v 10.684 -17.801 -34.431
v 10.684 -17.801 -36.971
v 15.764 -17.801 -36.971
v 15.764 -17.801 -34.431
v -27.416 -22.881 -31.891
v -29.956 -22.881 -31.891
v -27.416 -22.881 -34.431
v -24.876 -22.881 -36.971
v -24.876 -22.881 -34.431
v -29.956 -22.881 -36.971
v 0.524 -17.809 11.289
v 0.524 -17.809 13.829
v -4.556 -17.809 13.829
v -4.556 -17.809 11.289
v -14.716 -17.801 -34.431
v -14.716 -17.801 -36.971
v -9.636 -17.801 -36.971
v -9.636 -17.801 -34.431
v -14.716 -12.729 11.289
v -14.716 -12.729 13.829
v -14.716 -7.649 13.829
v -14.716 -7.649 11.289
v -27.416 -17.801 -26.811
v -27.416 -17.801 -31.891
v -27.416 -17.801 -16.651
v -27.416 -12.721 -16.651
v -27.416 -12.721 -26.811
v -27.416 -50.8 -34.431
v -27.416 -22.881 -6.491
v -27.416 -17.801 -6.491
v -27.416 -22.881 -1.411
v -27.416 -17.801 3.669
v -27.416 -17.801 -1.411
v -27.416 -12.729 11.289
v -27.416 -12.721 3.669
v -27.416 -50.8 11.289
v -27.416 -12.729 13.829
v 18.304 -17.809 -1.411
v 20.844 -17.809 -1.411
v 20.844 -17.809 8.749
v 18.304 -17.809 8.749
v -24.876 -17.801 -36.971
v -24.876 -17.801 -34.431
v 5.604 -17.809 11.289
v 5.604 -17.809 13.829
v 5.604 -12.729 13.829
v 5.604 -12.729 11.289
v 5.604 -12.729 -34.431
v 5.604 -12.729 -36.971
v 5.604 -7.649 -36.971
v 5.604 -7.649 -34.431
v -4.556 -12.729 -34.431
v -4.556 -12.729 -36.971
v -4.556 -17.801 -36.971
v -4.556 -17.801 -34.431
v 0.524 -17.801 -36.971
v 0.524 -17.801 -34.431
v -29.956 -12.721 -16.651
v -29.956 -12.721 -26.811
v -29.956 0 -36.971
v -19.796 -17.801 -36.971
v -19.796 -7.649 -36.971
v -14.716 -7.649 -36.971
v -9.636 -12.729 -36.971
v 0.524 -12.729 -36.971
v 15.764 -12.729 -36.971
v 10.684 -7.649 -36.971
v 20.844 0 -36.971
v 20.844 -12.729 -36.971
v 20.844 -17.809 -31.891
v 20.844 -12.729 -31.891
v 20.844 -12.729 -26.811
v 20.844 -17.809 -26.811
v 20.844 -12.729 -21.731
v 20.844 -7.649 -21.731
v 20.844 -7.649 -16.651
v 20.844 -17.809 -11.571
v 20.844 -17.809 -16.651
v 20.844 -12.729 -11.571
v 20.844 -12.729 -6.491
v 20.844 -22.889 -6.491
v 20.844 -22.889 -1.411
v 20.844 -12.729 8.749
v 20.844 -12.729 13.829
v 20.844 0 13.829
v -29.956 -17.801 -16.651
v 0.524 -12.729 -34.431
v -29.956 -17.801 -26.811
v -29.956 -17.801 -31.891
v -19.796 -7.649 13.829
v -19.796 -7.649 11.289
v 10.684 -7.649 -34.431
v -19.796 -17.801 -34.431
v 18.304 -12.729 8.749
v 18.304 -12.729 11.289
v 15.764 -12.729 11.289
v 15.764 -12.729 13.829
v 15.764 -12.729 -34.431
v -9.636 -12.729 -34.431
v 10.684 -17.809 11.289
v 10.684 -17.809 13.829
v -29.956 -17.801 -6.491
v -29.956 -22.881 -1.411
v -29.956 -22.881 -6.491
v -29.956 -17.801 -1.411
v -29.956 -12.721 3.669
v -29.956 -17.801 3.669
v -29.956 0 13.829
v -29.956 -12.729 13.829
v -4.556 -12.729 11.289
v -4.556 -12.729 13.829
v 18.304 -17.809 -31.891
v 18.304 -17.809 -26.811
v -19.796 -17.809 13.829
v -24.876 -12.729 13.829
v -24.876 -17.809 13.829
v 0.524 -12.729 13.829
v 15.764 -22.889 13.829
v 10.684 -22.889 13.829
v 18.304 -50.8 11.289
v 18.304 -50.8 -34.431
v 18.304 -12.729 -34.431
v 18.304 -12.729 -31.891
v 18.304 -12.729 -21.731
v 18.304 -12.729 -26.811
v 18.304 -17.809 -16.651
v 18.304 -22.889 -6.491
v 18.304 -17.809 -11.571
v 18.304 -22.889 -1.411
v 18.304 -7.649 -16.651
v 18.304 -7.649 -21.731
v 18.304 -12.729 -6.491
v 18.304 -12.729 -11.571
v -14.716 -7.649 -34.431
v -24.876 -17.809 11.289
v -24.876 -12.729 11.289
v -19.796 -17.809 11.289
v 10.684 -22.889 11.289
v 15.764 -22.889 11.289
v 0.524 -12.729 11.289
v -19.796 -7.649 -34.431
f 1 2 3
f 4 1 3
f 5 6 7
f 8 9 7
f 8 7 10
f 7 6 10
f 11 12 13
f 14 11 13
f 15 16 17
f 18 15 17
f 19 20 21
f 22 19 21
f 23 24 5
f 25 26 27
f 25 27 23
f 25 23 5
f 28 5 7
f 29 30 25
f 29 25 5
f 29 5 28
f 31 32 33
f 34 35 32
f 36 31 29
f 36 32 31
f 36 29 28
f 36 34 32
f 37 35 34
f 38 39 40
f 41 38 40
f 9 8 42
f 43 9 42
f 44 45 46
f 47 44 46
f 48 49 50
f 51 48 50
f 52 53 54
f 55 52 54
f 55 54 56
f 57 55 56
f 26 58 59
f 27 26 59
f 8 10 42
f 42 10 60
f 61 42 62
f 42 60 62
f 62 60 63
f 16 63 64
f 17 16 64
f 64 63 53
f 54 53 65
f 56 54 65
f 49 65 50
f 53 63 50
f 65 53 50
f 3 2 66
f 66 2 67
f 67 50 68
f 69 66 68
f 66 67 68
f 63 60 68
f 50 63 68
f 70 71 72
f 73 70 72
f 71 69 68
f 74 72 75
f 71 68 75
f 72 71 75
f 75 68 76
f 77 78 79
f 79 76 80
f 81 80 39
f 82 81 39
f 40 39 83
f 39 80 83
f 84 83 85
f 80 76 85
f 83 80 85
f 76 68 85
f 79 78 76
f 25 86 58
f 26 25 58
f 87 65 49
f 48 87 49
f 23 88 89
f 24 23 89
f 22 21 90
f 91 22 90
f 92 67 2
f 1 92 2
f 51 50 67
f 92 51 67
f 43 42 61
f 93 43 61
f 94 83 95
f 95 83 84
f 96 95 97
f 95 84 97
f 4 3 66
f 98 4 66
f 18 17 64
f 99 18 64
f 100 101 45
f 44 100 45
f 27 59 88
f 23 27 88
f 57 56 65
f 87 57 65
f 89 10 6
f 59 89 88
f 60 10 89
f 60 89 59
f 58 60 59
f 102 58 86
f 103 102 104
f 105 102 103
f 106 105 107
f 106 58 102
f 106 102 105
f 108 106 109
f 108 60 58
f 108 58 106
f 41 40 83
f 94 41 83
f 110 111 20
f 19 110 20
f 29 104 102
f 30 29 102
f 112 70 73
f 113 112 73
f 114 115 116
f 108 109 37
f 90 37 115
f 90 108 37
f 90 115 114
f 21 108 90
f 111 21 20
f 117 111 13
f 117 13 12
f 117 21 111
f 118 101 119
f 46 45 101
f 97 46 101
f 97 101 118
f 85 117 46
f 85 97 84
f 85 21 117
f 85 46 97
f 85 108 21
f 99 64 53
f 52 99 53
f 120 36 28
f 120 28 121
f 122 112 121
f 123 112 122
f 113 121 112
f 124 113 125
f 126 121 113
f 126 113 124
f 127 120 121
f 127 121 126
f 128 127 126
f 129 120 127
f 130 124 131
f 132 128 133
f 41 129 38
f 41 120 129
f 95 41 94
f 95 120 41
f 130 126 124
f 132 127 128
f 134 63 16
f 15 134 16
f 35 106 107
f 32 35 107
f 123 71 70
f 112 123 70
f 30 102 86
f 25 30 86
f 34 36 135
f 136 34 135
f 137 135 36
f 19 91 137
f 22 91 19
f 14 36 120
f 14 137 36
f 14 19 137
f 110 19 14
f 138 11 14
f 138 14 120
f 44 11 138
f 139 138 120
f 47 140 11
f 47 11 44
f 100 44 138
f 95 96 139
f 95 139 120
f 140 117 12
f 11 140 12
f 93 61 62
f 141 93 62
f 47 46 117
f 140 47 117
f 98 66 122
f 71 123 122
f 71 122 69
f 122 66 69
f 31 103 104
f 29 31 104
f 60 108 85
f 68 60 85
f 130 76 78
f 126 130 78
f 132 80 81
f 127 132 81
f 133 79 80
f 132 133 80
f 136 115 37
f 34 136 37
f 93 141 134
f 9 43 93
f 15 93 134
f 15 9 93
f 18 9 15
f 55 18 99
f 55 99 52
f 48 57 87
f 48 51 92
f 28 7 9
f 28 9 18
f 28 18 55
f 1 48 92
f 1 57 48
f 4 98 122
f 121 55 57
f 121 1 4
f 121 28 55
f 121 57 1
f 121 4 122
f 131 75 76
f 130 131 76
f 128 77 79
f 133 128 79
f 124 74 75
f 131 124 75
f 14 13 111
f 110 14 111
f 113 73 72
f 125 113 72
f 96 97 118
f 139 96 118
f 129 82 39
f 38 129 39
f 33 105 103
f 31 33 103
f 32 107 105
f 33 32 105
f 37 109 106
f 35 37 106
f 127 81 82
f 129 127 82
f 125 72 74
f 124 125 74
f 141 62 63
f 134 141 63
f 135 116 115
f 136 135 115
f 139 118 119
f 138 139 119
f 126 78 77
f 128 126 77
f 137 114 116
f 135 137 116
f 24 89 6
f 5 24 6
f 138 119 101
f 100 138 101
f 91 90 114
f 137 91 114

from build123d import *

# Parameters (mm, degrees)
F0_W     = 50.8
F0_H     = 50.8
F1_DEPTH = 50.8
F3_DEPTH = 2.54
F5_DEPTH = 2.54
F7_DEPTH = 2.54
F9_DEPTH = 2.54


with BuildPart() as f1:
    # F0 (on Front) → F1 (new body)
    with BuildSketch(Plane.XZ):
        with Locations((-4.556354, -11.571446)):
            Rectangle(F0_W, F0_H)
    extrude(amount=F1_DEPTH)

    # F2 (on face) → F3 (cut)
    with BuildSketch(Plane.XY.offset(13.828554)):
        Polygon((-24.876354, -12.728567), (-29.956354, -12.728567), (-29.956354, -50.8), (20.843646, -50.8), (20.843646, -12.728567), (15.763646, -12.728567), (15.763646, -22.888567), (10.683646, -22.888567), (10.683646, -17.808567), (5.603646, -17.808567), (5.603646, -12.728567), (0.523646, -12.728567), (0.523646, -17.808567), (-4.556354, -17.808567), (-4.556354, -12.728567), (-9.636354, -12.728567), (-14.716354, -12.728567), (-14.716354, -7.648567), (-19.796354, -7.648567), (-19.796354, -17.808567), (-24.876354, -17.808567), align=None)
    extrude(amount=-F3_DEPTH, mode=Mode.SUBTRACT)

    # F4 (on face) → F5 (cut)
    with BuildSketch(Plane.YZ.offset(20.843646)):
        Polygon((-12.728567, 8.748554), (-12.728567, 11.288554), (-50.8, 11.288554), (-50.8, -36.971446), (-12.728567, -36.971446), (-12.728567, -31.891446), (-17.808567, -31.891446), (-17.808567, -26.811446), (-12.728567, -26.811446), (-12.728567, -21.731446), (-7.648567, -21.731446), (-7.648567, -16.651446), (-12.728567, -16.651446), (-17.808567, -16.651446), (-17.808567, -11.571446), (-12.728567, -11.571446), (-12.728567, -6.491446), (-22.888567, -6.491446), (-22.888567, -1.411446), (-17.808567, -1.411446), (-17.808567, 3.668554), (-17.808567, 8.748554), align=None)
    extrude(amount=-F5_DEPTH, mode=Mode.SUBTRACT)

    # F6 (on face) → F7 (cut)
    with BuildSketch(Plane(origin=(0, 0, -36.971446), x_dir=(1, 0, 0), z_dir=(0, 0, -1))):
        Polygon((15.763646, 12.728567), (18.303646, 12.728567), (18.303646, 50.8), (-29.956354, 50.8), (-29.956354, 22.881104), (-24.876354, 22.881104), (-24.876354, 17.801104), (-19.796354, 17.801104), (-19.796354, 7.648567), (-14.716354, 7.648567), (-14.716354, 17.801104), (-9.636354, 17.801104), (-9.636354, 12.728567), (-4.556354, 12.728567), (-4.556354, 17.801104), (0.523646, 17.801104), (0.523646, 12.728567), (5.603646, 12.728567), (5.603646, 7.648567), (10.683646, 7.648567), (10.683646, 12.728567), (10.683646, 17.801104), (15.763646, 17.801104), align=None)
    extrude(amount=-F7_DEPTH, mode=Mode.SUBTRACT)

    # F8 (on face) → F9 (cut)
    with BuildSketch(Plane(origin=(-29.956354, 0, 0), x_dir=(0, -1, 0), z_dir=(-1, 0, 0))):
        Polygon((22.881104, -31.891446), (22.881104, -34.431446), (50.8, -34.431446), (50.8, 11.288554), (12.728567, 11.288554), (12.728567, 13.828554), (12.721104, 3.668554), (17.801104, 3.668554), (17.801104, -1.411446), (22.881104, -1.411446), (22.881104, -6.491446), (17.801104, -6.491446), (17.801104, -11.571446), (17.801104, -16.651446), (12.721104, -16.651446), (12.721104, -26.811446), (17.801104, -26.811446), (17.801104, -31.891446), align=None)
    extrude(amount=-F9_DEPTH, mode=Mode.SUBTRACT)


solid = f1.part
